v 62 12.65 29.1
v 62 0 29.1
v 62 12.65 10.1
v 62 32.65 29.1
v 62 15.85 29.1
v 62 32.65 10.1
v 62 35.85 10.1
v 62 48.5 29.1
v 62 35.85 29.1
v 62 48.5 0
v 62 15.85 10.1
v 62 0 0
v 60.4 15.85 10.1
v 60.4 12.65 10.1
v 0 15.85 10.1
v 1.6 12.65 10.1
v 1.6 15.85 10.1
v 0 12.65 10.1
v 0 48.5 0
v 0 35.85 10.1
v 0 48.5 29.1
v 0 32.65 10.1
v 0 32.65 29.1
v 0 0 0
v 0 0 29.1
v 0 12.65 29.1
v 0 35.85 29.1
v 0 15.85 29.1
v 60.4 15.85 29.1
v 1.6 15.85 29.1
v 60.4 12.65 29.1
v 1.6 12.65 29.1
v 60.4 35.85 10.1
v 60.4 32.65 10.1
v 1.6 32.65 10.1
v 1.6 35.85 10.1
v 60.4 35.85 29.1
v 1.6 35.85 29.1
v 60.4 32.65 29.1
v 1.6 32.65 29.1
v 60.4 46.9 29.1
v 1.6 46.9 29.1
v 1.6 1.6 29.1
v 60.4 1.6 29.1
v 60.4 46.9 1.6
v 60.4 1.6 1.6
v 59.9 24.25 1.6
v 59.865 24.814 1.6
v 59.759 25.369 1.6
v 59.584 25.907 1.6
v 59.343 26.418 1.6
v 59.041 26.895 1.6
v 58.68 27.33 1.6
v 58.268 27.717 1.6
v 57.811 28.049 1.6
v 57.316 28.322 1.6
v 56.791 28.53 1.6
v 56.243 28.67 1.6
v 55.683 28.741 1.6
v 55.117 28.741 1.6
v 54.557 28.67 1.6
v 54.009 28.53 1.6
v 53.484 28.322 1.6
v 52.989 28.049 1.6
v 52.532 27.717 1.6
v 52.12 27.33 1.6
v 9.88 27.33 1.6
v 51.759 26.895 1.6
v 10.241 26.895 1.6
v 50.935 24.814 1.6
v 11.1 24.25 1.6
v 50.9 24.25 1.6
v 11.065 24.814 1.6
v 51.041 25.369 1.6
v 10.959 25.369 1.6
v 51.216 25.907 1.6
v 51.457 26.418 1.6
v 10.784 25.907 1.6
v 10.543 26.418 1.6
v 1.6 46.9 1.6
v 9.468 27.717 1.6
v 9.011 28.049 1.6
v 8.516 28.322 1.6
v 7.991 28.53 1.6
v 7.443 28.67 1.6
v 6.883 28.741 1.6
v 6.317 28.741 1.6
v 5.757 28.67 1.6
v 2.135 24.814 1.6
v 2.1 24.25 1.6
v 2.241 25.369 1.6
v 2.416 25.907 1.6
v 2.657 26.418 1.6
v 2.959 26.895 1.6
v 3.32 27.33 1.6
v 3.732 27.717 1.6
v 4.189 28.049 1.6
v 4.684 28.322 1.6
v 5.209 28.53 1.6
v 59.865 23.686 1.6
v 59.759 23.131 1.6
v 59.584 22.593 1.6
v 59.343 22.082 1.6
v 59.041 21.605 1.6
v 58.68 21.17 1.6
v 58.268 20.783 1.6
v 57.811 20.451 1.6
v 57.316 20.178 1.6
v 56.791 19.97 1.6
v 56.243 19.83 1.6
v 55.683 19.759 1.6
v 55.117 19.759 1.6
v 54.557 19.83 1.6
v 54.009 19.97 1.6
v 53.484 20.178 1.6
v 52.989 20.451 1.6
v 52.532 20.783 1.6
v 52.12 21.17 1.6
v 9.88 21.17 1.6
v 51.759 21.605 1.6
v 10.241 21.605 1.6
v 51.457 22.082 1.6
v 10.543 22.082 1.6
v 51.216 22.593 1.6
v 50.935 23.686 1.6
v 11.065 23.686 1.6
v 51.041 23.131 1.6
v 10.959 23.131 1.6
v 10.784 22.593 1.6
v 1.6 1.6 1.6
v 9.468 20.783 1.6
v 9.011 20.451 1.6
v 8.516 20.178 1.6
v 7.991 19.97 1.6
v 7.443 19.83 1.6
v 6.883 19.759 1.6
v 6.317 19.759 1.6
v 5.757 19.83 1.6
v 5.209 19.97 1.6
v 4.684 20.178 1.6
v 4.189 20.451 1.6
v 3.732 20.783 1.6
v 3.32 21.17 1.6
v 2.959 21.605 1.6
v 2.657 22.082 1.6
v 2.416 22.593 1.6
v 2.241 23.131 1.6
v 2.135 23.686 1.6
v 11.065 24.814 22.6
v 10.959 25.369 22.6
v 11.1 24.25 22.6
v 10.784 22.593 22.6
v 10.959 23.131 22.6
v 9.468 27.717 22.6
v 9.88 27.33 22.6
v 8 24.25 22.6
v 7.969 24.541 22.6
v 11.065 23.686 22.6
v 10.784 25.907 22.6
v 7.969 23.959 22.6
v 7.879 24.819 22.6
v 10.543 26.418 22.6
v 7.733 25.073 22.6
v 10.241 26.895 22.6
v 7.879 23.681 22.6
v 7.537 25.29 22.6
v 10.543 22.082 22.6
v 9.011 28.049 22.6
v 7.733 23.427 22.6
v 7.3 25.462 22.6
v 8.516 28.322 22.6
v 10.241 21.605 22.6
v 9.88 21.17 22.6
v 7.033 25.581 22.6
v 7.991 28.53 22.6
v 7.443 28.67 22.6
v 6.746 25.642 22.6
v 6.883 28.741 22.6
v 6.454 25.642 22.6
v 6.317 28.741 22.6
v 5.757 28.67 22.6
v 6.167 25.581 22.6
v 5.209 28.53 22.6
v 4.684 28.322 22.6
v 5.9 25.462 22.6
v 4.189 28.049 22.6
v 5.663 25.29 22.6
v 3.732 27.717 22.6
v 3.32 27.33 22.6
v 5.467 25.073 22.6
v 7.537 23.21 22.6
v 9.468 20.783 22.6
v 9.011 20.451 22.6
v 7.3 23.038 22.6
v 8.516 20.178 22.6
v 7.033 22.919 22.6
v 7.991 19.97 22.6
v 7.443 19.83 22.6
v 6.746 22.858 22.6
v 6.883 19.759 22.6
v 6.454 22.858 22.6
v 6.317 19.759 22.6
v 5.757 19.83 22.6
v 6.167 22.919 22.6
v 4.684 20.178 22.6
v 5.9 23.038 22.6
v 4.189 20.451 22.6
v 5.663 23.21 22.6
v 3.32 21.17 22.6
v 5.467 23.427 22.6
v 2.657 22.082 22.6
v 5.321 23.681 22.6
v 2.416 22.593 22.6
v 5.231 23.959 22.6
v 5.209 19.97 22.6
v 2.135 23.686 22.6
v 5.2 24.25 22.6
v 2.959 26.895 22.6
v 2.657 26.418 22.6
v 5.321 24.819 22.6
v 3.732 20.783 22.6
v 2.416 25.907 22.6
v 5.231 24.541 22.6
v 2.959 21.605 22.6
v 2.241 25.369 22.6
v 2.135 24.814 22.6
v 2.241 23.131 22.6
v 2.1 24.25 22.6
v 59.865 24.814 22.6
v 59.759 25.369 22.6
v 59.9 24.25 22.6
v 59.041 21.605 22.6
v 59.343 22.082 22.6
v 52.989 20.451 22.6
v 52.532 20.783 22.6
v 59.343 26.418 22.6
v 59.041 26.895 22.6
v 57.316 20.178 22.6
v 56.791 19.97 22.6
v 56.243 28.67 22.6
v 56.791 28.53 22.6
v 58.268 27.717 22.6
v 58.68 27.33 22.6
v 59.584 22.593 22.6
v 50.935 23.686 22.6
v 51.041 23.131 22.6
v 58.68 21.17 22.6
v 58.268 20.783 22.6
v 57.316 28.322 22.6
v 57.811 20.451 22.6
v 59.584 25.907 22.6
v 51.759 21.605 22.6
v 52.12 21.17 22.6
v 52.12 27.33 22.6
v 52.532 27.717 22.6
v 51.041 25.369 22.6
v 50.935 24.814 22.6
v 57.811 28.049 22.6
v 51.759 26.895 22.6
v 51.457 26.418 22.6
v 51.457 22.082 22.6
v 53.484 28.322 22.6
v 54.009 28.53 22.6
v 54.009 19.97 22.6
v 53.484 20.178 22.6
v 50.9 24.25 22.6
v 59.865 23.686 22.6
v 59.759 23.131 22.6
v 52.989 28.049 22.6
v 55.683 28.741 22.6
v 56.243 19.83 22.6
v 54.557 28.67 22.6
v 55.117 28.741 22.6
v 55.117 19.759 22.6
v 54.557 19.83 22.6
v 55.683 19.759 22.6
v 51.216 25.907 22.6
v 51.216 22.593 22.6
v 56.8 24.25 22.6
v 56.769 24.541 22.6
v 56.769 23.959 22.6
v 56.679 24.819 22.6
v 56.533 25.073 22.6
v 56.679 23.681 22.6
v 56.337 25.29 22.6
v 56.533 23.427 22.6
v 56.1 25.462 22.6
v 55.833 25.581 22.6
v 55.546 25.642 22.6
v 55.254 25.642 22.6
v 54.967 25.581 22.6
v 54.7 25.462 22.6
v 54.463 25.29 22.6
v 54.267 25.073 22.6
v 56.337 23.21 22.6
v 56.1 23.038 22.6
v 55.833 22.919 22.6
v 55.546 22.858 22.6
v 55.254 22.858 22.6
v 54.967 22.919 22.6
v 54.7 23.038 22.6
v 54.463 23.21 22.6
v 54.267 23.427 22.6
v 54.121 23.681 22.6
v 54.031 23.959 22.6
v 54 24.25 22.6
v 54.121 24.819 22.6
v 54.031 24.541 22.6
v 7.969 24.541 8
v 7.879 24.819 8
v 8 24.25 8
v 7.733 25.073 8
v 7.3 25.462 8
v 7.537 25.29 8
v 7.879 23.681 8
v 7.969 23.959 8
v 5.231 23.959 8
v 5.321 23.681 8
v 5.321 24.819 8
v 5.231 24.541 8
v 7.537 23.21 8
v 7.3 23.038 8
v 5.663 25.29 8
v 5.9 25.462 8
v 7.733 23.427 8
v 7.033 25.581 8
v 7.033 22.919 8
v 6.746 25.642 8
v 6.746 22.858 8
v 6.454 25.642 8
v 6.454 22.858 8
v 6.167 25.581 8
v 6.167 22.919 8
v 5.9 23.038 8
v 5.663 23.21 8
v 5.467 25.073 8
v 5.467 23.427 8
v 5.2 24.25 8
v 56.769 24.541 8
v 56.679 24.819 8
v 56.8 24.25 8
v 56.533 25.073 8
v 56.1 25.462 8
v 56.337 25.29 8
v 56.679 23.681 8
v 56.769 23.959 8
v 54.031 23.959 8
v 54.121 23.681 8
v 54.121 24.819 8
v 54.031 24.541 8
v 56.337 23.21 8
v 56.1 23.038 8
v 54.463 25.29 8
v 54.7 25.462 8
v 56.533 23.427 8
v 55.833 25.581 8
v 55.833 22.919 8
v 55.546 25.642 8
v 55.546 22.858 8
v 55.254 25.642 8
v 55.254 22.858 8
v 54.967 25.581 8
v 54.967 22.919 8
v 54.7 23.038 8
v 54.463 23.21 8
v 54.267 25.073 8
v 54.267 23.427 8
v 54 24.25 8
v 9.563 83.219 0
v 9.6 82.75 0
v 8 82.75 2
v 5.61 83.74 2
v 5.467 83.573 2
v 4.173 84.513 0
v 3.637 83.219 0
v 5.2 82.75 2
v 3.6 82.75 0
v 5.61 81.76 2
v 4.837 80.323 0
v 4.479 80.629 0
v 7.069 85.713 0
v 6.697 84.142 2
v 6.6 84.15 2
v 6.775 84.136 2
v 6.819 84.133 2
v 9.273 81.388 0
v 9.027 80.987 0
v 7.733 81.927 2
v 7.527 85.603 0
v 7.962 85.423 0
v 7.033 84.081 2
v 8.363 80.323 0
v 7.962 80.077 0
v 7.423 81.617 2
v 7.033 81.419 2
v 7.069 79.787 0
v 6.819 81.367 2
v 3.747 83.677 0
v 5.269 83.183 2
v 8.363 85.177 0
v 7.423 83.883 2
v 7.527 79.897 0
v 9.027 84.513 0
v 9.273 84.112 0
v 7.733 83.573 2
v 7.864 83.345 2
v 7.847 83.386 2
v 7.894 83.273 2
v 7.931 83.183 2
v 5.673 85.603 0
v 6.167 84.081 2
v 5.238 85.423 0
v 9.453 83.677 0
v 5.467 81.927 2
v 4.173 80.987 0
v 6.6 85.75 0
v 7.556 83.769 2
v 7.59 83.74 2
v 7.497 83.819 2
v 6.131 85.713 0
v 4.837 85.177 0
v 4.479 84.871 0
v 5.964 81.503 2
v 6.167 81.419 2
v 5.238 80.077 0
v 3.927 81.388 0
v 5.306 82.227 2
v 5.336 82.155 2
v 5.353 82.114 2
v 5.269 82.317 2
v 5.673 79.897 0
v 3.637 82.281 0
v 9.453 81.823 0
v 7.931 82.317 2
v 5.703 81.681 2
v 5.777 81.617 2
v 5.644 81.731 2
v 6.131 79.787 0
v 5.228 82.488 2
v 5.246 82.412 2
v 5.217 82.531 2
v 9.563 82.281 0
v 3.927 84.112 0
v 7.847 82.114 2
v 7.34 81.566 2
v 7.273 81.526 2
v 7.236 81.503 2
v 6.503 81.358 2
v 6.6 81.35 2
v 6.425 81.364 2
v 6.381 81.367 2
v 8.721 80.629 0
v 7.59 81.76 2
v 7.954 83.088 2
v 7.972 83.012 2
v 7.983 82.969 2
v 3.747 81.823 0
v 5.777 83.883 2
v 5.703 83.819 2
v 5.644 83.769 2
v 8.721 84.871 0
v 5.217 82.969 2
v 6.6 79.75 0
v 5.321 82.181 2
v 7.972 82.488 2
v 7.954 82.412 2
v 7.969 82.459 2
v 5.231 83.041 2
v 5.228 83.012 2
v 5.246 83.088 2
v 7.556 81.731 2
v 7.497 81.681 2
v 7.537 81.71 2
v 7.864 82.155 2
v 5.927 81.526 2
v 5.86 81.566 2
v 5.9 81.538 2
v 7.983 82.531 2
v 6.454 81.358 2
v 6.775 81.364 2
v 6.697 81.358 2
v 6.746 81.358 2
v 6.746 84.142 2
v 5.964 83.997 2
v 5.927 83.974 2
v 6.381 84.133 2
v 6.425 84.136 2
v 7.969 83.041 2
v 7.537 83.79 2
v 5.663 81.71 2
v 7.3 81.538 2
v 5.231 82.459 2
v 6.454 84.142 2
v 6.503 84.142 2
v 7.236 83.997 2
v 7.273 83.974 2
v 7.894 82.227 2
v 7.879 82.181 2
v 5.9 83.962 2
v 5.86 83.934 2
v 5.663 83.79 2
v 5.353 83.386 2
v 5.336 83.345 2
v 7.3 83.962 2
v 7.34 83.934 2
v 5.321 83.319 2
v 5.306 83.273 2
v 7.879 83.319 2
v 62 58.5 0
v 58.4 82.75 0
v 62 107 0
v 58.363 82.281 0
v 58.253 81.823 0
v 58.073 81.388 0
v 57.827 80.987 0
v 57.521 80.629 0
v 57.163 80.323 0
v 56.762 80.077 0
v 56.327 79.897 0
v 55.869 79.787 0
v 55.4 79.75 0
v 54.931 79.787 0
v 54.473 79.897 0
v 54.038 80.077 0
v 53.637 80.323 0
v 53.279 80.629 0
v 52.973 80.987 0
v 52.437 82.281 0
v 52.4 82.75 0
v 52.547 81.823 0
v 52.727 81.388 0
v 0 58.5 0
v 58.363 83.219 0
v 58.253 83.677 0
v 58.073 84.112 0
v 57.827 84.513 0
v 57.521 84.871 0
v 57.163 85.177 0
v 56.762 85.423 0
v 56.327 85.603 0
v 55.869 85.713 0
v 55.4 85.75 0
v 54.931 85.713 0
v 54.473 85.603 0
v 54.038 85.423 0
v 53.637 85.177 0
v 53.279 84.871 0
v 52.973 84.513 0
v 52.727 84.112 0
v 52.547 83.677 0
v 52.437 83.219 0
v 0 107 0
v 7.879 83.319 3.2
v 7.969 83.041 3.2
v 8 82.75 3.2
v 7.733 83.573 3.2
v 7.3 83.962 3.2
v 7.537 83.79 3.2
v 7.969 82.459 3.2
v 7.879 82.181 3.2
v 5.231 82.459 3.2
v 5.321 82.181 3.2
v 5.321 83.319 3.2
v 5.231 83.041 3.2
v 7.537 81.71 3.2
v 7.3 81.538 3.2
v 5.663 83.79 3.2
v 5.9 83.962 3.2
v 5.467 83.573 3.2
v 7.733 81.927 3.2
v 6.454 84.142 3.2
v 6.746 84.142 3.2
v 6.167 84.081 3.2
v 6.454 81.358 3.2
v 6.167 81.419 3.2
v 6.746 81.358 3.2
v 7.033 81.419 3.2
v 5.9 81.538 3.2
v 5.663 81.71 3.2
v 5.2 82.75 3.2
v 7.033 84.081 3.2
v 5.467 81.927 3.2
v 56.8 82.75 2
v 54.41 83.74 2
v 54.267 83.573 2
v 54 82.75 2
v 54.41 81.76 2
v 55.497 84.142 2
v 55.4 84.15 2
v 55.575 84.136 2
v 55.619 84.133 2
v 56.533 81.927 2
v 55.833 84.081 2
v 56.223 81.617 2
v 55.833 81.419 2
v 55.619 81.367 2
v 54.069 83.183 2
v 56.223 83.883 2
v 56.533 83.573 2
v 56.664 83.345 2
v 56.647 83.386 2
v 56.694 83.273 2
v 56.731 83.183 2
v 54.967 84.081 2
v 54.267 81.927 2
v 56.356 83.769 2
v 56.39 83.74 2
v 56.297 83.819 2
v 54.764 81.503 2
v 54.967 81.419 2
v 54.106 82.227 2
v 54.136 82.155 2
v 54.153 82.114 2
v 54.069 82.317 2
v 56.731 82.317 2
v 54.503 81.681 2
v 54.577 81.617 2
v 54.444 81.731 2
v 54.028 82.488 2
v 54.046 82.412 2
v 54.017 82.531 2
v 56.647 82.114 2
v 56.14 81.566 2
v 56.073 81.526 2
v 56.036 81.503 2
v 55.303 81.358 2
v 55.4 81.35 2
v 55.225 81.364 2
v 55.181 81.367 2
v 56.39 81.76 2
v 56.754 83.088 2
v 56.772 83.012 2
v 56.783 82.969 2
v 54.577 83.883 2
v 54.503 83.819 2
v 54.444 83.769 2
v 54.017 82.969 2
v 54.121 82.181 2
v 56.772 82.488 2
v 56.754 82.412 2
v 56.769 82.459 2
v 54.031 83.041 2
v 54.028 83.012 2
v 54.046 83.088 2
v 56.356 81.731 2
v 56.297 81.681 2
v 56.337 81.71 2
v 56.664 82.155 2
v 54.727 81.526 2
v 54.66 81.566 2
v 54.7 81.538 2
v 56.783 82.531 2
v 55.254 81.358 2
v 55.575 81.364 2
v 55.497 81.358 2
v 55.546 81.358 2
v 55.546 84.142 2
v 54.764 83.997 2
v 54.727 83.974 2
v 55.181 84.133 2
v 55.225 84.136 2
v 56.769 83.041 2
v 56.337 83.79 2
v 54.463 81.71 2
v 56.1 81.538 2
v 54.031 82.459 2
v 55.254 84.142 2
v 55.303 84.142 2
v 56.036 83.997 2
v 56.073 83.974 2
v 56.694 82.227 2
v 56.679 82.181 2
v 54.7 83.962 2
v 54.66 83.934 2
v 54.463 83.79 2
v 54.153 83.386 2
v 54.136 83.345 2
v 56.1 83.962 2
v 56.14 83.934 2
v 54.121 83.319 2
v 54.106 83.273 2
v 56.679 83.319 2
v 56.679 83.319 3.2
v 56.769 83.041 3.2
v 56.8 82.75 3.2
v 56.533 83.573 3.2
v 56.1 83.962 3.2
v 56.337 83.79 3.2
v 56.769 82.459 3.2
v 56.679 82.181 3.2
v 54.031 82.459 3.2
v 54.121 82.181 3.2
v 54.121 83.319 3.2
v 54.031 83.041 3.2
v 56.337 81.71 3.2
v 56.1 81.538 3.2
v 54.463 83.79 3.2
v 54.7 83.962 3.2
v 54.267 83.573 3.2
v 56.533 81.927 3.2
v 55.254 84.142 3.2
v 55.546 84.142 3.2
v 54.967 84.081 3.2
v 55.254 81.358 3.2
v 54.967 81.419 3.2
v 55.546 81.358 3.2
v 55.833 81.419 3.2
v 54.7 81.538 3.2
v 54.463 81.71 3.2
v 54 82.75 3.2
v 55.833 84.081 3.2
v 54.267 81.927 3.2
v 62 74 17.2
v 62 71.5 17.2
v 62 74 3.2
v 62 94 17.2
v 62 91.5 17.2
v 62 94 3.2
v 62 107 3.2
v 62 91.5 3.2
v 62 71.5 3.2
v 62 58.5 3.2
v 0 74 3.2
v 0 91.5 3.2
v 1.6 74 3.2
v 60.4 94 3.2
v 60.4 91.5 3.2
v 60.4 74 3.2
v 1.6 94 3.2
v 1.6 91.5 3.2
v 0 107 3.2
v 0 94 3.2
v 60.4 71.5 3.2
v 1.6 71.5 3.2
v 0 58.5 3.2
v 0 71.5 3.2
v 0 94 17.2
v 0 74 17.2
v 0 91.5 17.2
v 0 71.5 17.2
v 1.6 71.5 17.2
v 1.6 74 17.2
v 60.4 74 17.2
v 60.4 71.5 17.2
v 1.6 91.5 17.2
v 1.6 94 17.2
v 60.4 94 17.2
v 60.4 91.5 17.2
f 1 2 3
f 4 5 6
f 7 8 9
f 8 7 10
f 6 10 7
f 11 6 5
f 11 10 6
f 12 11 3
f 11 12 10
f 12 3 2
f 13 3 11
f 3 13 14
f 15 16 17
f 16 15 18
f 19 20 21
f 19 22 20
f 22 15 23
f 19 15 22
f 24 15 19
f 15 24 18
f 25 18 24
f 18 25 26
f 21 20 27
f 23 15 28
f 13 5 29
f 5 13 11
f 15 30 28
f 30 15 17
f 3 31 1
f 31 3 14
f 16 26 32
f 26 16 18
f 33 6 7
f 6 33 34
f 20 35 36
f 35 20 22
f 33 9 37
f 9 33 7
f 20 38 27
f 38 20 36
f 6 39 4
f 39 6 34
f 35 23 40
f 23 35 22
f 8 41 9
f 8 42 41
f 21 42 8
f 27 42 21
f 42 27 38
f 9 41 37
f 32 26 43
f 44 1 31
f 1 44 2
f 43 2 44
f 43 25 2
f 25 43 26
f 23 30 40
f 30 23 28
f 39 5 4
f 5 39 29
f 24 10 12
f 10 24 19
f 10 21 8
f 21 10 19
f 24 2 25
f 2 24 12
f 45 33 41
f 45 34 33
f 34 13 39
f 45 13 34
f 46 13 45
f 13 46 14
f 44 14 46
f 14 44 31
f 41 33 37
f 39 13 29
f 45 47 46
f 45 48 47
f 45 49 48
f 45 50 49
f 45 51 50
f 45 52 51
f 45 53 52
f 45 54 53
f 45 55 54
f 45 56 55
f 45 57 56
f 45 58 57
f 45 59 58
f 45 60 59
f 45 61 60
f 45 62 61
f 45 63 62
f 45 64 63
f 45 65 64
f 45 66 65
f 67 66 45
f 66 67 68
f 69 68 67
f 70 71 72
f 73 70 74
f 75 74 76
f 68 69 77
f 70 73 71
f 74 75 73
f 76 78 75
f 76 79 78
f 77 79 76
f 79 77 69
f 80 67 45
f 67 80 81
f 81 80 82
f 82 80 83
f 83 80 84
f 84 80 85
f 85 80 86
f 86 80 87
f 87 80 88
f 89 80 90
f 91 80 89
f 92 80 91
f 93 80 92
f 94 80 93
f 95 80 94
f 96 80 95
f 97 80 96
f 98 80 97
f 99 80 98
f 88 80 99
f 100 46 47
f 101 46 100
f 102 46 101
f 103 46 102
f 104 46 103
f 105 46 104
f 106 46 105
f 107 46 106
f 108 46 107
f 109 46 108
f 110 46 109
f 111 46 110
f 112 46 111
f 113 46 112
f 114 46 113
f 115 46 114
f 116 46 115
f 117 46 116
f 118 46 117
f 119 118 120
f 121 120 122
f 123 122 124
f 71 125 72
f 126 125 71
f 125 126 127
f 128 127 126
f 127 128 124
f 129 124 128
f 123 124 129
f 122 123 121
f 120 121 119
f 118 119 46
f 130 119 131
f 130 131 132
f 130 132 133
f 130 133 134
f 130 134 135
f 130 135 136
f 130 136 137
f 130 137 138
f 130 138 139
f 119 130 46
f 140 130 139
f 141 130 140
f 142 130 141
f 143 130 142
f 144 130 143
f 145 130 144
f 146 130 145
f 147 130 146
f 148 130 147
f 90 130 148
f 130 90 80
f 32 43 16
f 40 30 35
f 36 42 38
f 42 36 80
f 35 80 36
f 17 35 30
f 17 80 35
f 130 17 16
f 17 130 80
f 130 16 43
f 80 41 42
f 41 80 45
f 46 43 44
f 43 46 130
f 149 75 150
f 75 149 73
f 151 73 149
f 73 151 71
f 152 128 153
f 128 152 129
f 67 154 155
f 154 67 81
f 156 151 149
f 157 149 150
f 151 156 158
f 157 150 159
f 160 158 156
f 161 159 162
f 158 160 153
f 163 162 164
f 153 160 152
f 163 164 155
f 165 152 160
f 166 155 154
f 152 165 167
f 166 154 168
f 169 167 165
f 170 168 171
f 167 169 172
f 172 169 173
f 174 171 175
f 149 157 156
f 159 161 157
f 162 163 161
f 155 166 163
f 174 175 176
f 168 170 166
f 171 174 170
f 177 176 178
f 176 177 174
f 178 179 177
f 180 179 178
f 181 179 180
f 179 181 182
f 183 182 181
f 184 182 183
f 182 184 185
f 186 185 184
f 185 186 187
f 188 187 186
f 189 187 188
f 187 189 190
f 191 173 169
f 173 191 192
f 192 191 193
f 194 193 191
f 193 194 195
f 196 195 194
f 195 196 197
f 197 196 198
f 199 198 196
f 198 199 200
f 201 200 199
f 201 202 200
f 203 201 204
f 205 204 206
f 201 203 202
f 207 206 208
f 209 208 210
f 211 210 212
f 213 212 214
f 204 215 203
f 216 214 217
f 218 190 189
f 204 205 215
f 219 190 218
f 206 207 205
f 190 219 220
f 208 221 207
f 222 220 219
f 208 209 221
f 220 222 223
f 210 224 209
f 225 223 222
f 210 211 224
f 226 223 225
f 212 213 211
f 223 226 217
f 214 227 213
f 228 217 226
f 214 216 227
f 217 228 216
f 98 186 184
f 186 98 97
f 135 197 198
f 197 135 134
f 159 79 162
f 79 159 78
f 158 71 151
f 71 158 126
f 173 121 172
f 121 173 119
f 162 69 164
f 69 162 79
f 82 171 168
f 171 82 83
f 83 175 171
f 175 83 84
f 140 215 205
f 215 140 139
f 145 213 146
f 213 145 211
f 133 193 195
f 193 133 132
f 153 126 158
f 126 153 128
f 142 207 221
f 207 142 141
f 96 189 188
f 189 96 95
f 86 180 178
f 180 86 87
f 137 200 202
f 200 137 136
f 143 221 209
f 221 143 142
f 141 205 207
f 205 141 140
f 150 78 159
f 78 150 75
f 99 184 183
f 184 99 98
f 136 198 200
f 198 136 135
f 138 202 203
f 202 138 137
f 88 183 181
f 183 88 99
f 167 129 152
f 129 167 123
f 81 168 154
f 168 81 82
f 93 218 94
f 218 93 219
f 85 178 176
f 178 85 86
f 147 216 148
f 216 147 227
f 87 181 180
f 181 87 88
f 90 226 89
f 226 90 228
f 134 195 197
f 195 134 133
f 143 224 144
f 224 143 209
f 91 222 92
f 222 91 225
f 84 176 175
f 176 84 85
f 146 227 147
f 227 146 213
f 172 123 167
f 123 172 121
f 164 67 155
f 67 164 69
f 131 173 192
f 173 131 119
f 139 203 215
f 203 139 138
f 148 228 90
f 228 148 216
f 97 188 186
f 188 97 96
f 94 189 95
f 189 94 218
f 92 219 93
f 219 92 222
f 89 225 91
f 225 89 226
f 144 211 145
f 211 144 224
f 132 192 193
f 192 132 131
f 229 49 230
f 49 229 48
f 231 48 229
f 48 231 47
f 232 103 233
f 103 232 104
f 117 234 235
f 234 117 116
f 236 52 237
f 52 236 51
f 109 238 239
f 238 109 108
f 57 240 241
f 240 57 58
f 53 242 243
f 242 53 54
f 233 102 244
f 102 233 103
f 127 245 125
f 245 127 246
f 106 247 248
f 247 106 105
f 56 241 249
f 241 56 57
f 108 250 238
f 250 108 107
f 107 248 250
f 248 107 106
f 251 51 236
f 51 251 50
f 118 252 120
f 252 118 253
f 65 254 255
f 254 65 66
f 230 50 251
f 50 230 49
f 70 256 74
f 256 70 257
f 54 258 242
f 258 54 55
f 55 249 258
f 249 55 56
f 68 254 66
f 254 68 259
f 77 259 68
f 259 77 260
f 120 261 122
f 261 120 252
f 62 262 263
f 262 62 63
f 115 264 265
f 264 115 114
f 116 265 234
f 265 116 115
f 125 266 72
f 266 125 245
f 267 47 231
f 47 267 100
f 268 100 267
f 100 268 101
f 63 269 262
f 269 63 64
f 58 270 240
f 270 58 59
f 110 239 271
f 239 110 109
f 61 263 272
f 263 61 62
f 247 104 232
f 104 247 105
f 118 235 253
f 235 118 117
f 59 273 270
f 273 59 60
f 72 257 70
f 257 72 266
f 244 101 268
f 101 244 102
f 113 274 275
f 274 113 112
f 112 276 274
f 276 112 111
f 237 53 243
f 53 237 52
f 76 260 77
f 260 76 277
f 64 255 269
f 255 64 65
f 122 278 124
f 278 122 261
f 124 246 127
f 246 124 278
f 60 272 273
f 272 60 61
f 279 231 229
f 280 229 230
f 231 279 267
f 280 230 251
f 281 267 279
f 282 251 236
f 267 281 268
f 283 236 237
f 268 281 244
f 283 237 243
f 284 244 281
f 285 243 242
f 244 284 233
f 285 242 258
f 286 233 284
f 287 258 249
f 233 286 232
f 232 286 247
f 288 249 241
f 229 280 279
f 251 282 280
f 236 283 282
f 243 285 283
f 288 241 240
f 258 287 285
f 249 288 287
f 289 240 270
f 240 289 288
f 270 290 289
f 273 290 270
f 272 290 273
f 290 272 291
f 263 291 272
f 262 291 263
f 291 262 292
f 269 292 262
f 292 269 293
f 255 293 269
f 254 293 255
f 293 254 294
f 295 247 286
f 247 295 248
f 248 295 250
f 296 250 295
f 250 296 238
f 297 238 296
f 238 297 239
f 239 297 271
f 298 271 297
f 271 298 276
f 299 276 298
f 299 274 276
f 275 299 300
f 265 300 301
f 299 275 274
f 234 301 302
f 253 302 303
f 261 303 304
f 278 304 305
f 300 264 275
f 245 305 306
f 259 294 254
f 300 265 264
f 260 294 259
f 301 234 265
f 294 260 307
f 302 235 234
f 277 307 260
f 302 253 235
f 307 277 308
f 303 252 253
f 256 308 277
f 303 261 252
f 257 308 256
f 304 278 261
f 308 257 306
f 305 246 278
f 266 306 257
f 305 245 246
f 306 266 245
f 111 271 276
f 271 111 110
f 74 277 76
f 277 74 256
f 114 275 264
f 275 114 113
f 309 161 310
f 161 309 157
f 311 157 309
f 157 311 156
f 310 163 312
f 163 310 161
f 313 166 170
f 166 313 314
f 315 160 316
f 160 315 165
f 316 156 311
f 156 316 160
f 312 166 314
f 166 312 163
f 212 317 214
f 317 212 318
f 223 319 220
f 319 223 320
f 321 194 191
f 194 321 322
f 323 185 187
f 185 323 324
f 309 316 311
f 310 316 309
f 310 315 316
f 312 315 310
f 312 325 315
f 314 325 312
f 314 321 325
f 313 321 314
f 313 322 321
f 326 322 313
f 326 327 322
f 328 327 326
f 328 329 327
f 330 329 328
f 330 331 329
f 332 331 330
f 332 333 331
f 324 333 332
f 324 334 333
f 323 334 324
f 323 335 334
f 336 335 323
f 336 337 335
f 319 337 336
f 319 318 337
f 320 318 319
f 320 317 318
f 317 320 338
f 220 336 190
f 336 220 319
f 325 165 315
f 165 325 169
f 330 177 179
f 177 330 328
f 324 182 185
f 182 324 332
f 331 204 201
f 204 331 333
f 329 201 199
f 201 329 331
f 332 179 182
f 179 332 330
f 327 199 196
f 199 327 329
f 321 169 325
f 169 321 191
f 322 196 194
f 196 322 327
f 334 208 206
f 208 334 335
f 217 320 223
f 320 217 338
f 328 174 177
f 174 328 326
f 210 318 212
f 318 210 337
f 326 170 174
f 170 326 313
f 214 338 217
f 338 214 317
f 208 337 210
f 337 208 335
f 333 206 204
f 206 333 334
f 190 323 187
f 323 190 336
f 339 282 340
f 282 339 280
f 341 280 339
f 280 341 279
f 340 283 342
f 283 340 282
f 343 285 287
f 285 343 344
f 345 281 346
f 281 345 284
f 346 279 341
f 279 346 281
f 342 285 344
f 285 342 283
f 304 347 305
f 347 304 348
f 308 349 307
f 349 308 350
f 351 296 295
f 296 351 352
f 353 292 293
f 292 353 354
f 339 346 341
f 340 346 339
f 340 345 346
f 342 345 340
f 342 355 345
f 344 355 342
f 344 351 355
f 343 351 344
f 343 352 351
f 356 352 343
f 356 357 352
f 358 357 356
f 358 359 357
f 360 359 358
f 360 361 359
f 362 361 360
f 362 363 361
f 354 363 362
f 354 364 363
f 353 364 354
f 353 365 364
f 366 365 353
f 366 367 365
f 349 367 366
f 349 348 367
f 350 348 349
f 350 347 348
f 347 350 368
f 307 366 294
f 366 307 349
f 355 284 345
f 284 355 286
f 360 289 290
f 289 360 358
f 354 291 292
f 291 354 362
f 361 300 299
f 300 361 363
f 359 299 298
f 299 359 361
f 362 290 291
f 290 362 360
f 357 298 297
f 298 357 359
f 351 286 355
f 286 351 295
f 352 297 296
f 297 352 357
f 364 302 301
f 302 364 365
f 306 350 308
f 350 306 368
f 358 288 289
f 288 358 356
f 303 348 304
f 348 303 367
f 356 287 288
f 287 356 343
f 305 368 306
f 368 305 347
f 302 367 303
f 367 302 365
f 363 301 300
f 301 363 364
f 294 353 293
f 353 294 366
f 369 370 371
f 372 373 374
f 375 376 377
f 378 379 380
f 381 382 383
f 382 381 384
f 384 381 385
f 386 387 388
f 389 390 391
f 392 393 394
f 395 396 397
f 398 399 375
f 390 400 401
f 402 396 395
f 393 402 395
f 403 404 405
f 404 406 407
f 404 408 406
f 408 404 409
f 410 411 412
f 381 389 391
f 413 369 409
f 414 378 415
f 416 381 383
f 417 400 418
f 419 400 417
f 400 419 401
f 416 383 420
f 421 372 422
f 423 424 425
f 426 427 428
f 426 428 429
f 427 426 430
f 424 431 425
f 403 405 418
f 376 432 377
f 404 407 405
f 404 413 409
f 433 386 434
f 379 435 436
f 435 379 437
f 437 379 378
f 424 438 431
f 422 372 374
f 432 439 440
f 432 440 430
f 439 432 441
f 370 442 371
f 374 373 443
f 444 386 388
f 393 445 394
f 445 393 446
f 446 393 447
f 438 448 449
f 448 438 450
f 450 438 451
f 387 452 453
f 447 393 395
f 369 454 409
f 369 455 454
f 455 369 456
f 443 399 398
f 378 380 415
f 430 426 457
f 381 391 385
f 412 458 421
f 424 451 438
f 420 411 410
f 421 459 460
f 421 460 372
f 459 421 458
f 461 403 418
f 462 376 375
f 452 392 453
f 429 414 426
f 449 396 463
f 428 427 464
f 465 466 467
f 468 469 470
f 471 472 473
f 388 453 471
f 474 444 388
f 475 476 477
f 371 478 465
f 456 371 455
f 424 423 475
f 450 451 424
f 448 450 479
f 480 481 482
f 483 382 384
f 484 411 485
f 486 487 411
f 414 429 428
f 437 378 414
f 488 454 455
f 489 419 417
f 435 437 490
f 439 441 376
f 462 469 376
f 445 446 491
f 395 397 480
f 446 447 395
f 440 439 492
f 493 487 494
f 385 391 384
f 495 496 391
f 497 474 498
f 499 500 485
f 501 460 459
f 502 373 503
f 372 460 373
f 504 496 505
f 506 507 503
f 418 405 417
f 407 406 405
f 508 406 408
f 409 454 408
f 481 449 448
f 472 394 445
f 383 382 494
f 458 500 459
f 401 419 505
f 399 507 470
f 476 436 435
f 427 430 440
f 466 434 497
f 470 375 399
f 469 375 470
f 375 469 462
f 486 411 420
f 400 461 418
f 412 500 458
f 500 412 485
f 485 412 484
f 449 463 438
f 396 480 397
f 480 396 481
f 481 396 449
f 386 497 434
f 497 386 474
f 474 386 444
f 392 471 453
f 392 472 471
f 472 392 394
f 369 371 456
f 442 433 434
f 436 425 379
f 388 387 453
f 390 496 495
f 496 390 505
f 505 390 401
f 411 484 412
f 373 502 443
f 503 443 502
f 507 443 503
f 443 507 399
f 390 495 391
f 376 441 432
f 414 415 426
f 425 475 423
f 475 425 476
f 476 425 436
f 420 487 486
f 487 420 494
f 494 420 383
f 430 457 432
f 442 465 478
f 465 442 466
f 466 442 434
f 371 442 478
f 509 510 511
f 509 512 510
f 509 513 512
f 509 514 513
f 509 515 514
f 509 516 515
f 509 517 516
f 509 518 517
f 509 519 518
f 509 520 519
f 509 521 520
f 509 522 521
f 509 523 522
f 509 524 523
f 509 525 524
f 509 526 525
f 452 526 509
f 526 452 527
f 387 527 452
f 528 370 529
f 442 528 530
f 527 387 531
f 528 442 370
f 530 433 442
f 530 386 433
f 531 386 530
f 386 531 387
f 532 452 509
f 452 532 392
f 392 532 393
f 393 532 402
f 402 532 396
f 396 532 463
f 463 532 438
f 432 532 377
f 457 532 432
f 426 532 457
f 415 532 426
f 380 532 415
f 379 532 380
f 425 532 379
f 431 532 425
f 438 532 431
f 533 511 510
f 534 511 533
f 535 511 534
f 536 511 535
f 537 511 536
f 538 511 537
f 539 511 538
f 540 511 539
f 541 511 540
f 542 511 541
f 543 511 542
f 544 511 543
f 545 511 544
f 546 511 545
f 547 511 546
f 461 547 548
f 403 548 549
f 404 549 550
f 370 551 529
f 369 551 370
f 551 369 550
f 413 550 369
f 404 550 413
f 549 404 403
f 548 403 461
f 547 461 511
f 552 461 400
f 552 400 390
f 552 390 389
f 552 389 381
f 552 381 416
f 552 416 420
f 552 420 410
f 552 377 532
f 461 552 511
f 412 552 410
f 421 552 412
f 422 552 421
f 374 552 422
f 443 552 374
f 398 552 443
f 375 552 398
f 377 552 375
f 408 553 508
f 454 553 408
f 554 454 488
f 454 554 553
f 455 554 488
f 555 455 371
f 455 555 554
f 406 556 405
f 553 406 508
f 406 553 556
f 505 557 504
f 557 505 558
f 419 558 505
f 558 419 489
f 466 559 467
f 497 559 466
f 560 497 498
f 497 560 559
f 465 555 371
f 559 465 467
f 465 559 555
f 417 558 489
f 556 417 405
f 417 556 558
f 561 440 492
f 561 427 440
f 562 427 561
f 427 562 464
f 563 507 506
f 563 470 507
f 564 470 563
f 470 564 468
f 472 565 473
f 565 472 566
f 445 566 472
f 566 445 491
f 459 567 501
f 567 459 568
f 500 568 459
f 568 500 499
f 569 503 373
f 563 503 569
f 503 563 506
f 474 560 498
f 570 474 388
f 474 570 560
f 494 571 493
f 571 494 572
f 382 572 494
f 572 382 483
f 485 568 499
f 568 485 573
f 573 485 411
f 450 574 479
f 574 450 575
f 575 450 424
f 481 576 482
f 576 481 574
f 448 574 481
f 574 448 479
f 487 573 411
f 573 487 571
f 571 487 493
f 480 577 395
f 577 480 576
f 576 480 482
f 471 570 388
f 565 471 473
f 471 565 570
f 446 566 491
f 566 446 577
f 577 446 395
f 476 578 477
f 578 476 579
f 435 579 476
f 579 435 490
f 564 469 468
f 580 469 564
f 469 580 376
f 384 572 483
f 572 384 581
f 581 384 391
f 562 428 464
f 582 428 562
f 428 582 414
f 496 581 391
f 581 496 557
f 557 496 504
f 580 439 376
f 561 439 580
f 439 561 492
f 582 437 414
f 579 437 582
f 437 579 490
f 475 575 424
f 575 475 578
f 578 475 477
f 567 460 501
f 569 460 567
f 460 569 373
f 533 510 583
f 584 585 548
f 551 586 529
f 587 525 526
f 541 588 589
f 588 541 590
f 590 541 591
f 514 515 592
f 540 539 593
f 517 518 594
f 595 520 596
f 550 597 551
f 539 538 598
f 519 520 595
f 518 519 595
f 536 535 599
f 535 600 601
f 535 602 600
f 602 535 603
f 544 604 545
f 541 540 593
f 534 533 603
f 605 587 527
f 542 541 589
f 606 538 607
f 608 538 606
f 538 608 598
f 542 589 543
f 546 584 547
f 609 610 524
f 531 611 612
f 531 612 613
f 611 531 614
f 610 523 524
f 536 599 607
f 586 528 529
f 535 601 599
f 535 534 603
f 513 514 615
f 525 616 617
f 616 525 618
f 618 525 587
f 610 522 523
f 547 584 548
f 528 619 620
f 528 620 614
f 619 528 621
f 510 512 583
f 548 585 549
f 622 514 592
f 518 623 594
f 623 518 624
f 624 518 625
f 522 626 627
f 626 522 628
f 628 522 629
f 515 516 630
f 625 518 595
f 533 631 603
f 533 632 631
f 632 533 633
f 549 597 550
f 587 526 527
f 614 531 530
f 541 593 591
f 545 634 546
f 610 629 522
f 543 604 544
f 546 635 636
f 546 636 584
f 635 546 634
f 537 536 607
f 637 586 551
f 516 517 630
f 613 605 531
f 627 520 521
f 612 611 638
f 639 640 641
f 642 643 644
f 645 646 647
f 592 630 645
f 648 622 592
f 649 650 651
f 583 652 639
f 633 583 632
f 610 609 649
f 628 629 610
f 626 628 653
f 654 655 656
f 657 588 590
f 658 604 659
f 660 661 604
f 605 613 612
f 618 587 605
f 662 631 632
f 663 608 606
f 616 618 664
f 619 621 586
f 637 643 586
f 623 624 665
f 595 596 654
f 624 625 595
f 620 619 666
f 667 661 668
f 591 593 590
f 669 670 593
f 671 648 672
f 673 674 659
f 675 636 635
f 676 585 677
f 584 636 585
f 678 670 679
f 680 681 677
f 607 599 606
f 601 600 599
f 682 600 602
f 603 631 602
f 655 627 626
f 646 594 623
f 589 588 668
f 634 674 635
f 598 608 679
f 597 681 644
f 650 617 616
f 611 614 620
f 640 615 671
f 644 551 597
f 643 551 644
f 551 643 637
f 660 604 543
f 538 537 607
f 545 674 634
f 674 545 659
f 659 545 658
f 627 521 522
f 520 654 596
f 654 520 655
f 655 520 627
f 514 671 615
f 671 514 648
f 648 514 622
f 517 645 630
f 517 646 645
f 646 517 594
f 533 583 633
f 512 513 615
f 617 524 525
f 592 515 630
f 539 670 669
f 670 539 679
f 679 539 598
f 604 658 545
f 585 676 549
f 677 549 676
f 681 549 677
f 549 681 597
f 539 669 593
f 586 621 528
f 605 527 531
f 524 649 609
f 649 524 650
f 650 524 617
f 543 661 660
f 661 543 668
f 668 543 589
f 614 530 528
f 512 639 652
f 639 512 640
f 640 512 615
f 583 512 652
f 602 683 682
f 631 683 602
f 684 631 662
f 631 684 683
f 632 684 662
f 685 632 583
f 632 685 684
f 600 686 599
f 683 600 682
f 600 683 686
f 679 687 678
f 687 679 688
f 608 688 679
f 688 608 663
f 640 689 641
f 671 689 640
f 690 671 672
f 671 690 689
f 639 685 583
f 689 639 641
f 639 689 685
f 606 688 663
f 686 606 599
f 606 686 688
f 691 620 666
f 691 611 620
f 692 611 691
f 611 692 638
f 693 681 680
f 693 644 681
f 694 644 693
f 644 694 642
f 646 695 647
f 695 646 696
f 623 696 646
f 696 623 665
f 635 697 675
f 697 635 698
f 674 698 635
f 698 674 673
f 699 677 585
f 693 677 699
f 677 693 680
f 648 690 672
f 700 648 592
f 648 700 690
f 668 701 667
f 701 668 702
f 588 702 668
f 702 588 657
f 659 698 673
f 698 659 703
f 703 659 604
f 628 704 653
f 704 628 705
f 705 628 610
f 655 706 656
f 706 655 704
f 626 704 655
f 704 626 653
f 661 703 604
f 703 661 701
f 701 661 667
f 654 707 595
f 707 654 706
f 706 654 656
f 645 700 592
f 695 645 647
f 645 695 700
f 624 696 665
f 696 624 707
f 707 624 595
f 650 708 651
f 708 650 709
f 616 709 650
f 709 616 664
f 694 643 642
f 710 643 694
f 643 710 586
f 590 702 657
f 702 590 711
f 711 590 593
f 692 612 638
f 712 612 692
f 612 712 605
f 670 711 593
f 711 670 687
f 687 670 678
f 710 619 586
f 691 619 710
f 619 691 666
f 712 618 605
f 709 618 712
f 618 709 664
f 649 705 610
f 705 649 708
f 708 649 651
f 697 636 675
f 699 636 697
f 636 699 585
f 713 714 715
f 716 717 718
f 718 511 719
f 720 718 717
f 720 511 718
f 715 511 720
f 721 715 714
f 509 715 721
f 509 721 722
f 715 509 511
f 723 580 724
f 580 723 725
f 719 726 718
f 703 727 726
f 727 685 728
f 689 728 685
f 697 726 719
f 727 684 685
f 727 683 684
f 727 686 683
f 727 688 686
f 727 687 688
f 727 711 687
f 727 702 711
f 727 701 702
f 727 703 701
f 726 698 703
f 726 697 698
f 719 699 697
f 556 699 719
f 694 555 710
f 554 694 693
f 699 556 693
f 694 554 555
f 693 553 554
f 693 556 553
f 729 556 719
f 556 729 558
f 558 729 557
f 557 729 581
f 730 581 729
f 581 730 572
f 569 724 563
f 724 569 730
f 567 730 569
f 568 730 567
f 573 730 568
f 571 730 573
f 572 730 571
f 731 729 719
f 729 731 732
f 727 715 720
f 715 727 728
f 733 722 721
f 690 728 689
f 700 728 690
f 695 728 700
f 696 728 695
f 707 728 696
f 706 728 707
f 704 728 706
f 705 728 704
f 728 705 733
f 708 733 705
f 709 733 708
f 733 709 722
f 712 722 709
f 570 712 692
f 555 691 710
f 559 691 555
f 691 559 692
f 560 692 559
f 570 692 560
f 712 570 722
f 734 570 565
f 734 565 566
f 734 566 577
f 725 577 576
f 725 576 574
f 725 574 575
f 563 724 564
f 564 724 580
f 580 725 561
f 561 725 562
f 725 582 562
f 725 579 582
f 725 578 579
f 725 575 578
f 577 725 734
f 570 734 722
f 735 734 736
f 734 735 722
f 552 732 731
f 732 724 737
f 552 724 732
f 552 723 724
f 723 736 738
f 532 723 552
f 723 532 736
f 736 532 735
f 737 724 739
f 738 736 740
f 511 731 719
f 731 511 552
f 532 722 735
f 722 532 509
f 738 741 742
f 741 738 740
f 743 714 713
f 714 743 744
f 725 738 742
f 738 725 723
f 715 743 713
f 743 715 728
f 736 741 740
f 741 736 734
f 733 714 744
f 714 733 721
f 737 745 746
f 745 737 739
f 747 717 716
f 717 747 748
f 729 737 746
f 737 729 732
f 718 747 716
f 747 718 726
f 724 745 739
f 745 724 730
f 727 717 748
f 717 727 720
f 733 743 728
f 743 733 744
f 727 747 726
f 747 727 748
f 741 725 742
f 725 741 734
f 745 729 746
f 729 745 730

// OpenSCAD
// A box for a standard Solid-State relay

module relay1() {
    WALL = 2;
    RELAY_LENGTH = 53;
    RELAY_WIDTH = 18.3;
    RELAY_HEIGHT = 21;
    RELAY_BASE_HEIGHT = 2.5;
    THREAD_R = 1.4;
    THERAD_HEAD_R = 3;
    THERAD_HEAD_H = 2;
    THREAD_OFFSET = 0.6;
    WIRE_CUT_SIZE = 3;
    LIFT = 0.8;
    FN = 30;

    CORNER_COLUMN_SIZE = WALL+THREAD_OFFSET+THREAD_R*2+1;
    TOTAL_LEN = RELAY_LENGTH+WALL*2+LIFT;
    TOTAL_WIDTH = RELAY_WIDTH+WALL*2+LIFT;  


    $fn = FN;

    module thread_cut() {
        cylinder(THERAD_HEAD_H, THERAD_HEAD_R, THREAD_R);
        
        translate([0, 0, THERAD_HEAD_H])
        cylinder(100, THREAD_R, THREAD_R);
    }

    module thread_cuts() {
        distance = WALL+THREAD_OFFSET+THREAD_R+LIFT/2;
        translate([distance, distance, 0])
        thread_cut();

        translate([TOTAL_LEN-distance, distance, 0])
        thread_cut();

        translate([distance, TOTAL_WIDTH-distance, 0])
        thread_cut();

        translate([TOTAL_LEN-distance, TOTAL_WIDTH-distance, 0])
        thread_cut();
    }

    module columns() {
        h = RELAY_HEIGHT-RELAY_BASE_HEIGHT;
        w = 1.5;
        translate([0, 0, RELAY_BASE_HEIGHT])
        cube([CORNER_COLUMN_SIZE, CORNER_COLUMN_SIZE, h]);

        translate([TOTAL_LEN-CORNER_COLUMN_SIZE, 0, RELAY_BASE_HEIGHT])
        cube([CORNER_COLUMN_SIZE, CORNER_COLUMN_SIZE, h]);

        translate([0, TOTAL_WIDTH-CORNER_COLUMN_SIZE, RELAY_BASE_HEIGHT])
        cube([CORNER_COLUMN_SIZE, CORNER_COLUMN_SIZE, h]);

        translate([TOTAL_LEN-CORNER_COLUMN_SIZE, TOTAL_WIDTH-CORNER_COLUMN_SIZE, RELAY_BASE_HEIGHT])
        cube([CORNER_COLUMN_SIZE, CORNER_COLUMN_SIZE, h]);
        
        distance = WALL+THREAD_OFFSET+THREAD_R+LIFT/2;
        translate([distance, distance, RELAY_BASE_HEIGHT])
        cylinder(h, THREAD_R+w, THREAD_R+w);

        translate([TOTAL_LEN-distance, distance, RELAY_BASE_HEIGHT])
        cylinder(h, THREAD_R+w, THREAD_R+w);

        translate([distance, TOTAL_WIDTH-distance, RELAY_BASE_HEIGHT])
        cylinder(h, THREAD_R+w, THREAD_R+w);

        translate([TOTAL_LEN-distance, TOTAL_WIDTH-distance, RELAY_BASE_HEIGHT])
        cylinder(h, THREAD_R+w, THREAD_R+w);
    }

    module bottom() {
        difference() {
            cube([TOTAL_LEN, TOTAL_WIDTH, WALL]);
            thread_cuts();
        }
    }

    module top() {
        difference() {
            columns();
            translate([0, 0, -THERAD_HEAD_H])
            thread_cuts();
        }
        
        difference() {
            cube([TOTAL_LEN, TOTAL_WIDTH, RELAY_HEIGHT+WALL]);
            
            translate([WALL, WALL, 0])
            cube([RELAY_LENGTH+LIFT, RELAY_WIDTH+LIFT, RELAY_HEIGHT]);
            
            translate([0, TOTAL_WIDTH/2-WIRE_CUT_SIZE/2, 0])
            cube([TOTAL_LEN, WIRE_CUT_SIZE, WIRE_CUT_SIZE]);
        }
    }

    bottom();

    translate([0, 0, 30])
    !top();
}

*relay1();






module relay2() {
    WALL = 1.6;
    RELAY_LENGTH = 58.8;
    RELAY_WIDTH = 45.3;
    RELAY_HEIGHT = 27.5;
    THREAD_D = 2.8;
    THREAD_HEAD_D = 6;
    THREAD_HEAD_H = 2;
    COLUMN_D = 9;
    COLUMN_OFFSET = 5;
    BASE_THICKNESS = 6.5;
    WIRE_CUT_HEIGHT = 19;
    WIRE_CUT_WIDTH = 2.5;
    WIRE_CUT_OFFSET_FROM_SIDE = 13;
    $fn=50;
    
    module thread() {
        cylinder(THREAD_HEAD_H, THREAD_HEAD_D/2, THREAD_D/2, $fn=40);
        translate([0, 0, THREAD_HEAD_H])
        cylinder(RELAY_HEIGHT-THREAD_HEAD_H-WALL*2, THREAD_D/2, THREAD_D/2, $fn=30);
    }
    
    module threads() {
        translate([WALL+COLUMN_OFFSET, RELAY_WIDTH/2+WALL, 0])
        thread();
        
        translate([WALL+RELAY_LENGTH - COLUMN_OFFSET, RELAY_WIDTH/2+WALL, 0])
        thread();
    }
    
    module wire_cuts(lift) {
        translate([0, WIRE_CUT_OFFSET_FROM_SIDE-lift/2, 0])
        cube([RELAY_LENGTH+WALL*2, WIRE_CUT_WIDTH+lift, WIRE_CUT_HEIGHT]);
        
        // Wire cut 2
        translate([0, RELAY_WIDTH+WALL*2-WIRE_CUT_OFFSET_FROM_SIDE-WIRE_CUT_WIDTH-lift/2, 0])
        cube([RELAY_LENGTH+WALL*2, WIRE_CUT_WIDTH+lift, WIRE_CUT_HEIGHT]);
    }

    module bottom() {
        // Box
        difference() {
            cube([RELAY_LENGTH + WALL*2, RELAY_WIDTH+WALL*2, RELAY_HEIGHT+WALL]);
            
            translate([WALL, WALL, WALL])
            cube([RELAY_LENGTH, RELAY_WIDTH, RELAY_HEIGHT]);
            
            translate([0, 0, WALL+RELAY_HEIGHT-WIRE_CUT_HEIGHT])
            wire_cuts(lift=0.7);
        }
        
        // Columns
        difference() {
            union() {
                column_h = RELAY_HEIGHT+WALL-BASE_THICKNESS;
                translate([WALL+COLUMN_OFFSET, RELAY_WIDTH/2+WALL, 0])
                cylinder(column_h, COLUMN_D/2, COLUMN_D/2);
                
                translate([WALL+RELAY_LENGTH - COLUMN_OFFSET, RELAY_WIDTH/2+WALL, 0])
                cylinder(column_h, COLUMN_D/2, COLUMN_D/2);
            }
            
            translate([0, 0, RELAY_HEIGHT+WALL*3])
            mirror([0, 0, 1])
            threads();
        }
    }
    
    module top() {
        difference() {
            cube([RELAY_LENGTH+WALL*2, RELAY_WIDTH+WALL*2, WALL*2]);
            threads();
        }

        
        difference() {
            translate([0, 0, WALL*2-WIRE_CUT_WIDTH*2])
            wire_cuts(lift=0);
            
            translate([WALL, WALL, WALL])
            cube([RELAY_LENGTH, RELAY_WIDTH, RELAY_HEIGHT]);
            
            translate([-500, -500, -1000])
            cube([1000, 1000, 1000]);
        }
    }
    
    bottom();
    
    translate([0, RELAY_WIDTH+WALL*2+10])
    top();
    
}

relay2();
